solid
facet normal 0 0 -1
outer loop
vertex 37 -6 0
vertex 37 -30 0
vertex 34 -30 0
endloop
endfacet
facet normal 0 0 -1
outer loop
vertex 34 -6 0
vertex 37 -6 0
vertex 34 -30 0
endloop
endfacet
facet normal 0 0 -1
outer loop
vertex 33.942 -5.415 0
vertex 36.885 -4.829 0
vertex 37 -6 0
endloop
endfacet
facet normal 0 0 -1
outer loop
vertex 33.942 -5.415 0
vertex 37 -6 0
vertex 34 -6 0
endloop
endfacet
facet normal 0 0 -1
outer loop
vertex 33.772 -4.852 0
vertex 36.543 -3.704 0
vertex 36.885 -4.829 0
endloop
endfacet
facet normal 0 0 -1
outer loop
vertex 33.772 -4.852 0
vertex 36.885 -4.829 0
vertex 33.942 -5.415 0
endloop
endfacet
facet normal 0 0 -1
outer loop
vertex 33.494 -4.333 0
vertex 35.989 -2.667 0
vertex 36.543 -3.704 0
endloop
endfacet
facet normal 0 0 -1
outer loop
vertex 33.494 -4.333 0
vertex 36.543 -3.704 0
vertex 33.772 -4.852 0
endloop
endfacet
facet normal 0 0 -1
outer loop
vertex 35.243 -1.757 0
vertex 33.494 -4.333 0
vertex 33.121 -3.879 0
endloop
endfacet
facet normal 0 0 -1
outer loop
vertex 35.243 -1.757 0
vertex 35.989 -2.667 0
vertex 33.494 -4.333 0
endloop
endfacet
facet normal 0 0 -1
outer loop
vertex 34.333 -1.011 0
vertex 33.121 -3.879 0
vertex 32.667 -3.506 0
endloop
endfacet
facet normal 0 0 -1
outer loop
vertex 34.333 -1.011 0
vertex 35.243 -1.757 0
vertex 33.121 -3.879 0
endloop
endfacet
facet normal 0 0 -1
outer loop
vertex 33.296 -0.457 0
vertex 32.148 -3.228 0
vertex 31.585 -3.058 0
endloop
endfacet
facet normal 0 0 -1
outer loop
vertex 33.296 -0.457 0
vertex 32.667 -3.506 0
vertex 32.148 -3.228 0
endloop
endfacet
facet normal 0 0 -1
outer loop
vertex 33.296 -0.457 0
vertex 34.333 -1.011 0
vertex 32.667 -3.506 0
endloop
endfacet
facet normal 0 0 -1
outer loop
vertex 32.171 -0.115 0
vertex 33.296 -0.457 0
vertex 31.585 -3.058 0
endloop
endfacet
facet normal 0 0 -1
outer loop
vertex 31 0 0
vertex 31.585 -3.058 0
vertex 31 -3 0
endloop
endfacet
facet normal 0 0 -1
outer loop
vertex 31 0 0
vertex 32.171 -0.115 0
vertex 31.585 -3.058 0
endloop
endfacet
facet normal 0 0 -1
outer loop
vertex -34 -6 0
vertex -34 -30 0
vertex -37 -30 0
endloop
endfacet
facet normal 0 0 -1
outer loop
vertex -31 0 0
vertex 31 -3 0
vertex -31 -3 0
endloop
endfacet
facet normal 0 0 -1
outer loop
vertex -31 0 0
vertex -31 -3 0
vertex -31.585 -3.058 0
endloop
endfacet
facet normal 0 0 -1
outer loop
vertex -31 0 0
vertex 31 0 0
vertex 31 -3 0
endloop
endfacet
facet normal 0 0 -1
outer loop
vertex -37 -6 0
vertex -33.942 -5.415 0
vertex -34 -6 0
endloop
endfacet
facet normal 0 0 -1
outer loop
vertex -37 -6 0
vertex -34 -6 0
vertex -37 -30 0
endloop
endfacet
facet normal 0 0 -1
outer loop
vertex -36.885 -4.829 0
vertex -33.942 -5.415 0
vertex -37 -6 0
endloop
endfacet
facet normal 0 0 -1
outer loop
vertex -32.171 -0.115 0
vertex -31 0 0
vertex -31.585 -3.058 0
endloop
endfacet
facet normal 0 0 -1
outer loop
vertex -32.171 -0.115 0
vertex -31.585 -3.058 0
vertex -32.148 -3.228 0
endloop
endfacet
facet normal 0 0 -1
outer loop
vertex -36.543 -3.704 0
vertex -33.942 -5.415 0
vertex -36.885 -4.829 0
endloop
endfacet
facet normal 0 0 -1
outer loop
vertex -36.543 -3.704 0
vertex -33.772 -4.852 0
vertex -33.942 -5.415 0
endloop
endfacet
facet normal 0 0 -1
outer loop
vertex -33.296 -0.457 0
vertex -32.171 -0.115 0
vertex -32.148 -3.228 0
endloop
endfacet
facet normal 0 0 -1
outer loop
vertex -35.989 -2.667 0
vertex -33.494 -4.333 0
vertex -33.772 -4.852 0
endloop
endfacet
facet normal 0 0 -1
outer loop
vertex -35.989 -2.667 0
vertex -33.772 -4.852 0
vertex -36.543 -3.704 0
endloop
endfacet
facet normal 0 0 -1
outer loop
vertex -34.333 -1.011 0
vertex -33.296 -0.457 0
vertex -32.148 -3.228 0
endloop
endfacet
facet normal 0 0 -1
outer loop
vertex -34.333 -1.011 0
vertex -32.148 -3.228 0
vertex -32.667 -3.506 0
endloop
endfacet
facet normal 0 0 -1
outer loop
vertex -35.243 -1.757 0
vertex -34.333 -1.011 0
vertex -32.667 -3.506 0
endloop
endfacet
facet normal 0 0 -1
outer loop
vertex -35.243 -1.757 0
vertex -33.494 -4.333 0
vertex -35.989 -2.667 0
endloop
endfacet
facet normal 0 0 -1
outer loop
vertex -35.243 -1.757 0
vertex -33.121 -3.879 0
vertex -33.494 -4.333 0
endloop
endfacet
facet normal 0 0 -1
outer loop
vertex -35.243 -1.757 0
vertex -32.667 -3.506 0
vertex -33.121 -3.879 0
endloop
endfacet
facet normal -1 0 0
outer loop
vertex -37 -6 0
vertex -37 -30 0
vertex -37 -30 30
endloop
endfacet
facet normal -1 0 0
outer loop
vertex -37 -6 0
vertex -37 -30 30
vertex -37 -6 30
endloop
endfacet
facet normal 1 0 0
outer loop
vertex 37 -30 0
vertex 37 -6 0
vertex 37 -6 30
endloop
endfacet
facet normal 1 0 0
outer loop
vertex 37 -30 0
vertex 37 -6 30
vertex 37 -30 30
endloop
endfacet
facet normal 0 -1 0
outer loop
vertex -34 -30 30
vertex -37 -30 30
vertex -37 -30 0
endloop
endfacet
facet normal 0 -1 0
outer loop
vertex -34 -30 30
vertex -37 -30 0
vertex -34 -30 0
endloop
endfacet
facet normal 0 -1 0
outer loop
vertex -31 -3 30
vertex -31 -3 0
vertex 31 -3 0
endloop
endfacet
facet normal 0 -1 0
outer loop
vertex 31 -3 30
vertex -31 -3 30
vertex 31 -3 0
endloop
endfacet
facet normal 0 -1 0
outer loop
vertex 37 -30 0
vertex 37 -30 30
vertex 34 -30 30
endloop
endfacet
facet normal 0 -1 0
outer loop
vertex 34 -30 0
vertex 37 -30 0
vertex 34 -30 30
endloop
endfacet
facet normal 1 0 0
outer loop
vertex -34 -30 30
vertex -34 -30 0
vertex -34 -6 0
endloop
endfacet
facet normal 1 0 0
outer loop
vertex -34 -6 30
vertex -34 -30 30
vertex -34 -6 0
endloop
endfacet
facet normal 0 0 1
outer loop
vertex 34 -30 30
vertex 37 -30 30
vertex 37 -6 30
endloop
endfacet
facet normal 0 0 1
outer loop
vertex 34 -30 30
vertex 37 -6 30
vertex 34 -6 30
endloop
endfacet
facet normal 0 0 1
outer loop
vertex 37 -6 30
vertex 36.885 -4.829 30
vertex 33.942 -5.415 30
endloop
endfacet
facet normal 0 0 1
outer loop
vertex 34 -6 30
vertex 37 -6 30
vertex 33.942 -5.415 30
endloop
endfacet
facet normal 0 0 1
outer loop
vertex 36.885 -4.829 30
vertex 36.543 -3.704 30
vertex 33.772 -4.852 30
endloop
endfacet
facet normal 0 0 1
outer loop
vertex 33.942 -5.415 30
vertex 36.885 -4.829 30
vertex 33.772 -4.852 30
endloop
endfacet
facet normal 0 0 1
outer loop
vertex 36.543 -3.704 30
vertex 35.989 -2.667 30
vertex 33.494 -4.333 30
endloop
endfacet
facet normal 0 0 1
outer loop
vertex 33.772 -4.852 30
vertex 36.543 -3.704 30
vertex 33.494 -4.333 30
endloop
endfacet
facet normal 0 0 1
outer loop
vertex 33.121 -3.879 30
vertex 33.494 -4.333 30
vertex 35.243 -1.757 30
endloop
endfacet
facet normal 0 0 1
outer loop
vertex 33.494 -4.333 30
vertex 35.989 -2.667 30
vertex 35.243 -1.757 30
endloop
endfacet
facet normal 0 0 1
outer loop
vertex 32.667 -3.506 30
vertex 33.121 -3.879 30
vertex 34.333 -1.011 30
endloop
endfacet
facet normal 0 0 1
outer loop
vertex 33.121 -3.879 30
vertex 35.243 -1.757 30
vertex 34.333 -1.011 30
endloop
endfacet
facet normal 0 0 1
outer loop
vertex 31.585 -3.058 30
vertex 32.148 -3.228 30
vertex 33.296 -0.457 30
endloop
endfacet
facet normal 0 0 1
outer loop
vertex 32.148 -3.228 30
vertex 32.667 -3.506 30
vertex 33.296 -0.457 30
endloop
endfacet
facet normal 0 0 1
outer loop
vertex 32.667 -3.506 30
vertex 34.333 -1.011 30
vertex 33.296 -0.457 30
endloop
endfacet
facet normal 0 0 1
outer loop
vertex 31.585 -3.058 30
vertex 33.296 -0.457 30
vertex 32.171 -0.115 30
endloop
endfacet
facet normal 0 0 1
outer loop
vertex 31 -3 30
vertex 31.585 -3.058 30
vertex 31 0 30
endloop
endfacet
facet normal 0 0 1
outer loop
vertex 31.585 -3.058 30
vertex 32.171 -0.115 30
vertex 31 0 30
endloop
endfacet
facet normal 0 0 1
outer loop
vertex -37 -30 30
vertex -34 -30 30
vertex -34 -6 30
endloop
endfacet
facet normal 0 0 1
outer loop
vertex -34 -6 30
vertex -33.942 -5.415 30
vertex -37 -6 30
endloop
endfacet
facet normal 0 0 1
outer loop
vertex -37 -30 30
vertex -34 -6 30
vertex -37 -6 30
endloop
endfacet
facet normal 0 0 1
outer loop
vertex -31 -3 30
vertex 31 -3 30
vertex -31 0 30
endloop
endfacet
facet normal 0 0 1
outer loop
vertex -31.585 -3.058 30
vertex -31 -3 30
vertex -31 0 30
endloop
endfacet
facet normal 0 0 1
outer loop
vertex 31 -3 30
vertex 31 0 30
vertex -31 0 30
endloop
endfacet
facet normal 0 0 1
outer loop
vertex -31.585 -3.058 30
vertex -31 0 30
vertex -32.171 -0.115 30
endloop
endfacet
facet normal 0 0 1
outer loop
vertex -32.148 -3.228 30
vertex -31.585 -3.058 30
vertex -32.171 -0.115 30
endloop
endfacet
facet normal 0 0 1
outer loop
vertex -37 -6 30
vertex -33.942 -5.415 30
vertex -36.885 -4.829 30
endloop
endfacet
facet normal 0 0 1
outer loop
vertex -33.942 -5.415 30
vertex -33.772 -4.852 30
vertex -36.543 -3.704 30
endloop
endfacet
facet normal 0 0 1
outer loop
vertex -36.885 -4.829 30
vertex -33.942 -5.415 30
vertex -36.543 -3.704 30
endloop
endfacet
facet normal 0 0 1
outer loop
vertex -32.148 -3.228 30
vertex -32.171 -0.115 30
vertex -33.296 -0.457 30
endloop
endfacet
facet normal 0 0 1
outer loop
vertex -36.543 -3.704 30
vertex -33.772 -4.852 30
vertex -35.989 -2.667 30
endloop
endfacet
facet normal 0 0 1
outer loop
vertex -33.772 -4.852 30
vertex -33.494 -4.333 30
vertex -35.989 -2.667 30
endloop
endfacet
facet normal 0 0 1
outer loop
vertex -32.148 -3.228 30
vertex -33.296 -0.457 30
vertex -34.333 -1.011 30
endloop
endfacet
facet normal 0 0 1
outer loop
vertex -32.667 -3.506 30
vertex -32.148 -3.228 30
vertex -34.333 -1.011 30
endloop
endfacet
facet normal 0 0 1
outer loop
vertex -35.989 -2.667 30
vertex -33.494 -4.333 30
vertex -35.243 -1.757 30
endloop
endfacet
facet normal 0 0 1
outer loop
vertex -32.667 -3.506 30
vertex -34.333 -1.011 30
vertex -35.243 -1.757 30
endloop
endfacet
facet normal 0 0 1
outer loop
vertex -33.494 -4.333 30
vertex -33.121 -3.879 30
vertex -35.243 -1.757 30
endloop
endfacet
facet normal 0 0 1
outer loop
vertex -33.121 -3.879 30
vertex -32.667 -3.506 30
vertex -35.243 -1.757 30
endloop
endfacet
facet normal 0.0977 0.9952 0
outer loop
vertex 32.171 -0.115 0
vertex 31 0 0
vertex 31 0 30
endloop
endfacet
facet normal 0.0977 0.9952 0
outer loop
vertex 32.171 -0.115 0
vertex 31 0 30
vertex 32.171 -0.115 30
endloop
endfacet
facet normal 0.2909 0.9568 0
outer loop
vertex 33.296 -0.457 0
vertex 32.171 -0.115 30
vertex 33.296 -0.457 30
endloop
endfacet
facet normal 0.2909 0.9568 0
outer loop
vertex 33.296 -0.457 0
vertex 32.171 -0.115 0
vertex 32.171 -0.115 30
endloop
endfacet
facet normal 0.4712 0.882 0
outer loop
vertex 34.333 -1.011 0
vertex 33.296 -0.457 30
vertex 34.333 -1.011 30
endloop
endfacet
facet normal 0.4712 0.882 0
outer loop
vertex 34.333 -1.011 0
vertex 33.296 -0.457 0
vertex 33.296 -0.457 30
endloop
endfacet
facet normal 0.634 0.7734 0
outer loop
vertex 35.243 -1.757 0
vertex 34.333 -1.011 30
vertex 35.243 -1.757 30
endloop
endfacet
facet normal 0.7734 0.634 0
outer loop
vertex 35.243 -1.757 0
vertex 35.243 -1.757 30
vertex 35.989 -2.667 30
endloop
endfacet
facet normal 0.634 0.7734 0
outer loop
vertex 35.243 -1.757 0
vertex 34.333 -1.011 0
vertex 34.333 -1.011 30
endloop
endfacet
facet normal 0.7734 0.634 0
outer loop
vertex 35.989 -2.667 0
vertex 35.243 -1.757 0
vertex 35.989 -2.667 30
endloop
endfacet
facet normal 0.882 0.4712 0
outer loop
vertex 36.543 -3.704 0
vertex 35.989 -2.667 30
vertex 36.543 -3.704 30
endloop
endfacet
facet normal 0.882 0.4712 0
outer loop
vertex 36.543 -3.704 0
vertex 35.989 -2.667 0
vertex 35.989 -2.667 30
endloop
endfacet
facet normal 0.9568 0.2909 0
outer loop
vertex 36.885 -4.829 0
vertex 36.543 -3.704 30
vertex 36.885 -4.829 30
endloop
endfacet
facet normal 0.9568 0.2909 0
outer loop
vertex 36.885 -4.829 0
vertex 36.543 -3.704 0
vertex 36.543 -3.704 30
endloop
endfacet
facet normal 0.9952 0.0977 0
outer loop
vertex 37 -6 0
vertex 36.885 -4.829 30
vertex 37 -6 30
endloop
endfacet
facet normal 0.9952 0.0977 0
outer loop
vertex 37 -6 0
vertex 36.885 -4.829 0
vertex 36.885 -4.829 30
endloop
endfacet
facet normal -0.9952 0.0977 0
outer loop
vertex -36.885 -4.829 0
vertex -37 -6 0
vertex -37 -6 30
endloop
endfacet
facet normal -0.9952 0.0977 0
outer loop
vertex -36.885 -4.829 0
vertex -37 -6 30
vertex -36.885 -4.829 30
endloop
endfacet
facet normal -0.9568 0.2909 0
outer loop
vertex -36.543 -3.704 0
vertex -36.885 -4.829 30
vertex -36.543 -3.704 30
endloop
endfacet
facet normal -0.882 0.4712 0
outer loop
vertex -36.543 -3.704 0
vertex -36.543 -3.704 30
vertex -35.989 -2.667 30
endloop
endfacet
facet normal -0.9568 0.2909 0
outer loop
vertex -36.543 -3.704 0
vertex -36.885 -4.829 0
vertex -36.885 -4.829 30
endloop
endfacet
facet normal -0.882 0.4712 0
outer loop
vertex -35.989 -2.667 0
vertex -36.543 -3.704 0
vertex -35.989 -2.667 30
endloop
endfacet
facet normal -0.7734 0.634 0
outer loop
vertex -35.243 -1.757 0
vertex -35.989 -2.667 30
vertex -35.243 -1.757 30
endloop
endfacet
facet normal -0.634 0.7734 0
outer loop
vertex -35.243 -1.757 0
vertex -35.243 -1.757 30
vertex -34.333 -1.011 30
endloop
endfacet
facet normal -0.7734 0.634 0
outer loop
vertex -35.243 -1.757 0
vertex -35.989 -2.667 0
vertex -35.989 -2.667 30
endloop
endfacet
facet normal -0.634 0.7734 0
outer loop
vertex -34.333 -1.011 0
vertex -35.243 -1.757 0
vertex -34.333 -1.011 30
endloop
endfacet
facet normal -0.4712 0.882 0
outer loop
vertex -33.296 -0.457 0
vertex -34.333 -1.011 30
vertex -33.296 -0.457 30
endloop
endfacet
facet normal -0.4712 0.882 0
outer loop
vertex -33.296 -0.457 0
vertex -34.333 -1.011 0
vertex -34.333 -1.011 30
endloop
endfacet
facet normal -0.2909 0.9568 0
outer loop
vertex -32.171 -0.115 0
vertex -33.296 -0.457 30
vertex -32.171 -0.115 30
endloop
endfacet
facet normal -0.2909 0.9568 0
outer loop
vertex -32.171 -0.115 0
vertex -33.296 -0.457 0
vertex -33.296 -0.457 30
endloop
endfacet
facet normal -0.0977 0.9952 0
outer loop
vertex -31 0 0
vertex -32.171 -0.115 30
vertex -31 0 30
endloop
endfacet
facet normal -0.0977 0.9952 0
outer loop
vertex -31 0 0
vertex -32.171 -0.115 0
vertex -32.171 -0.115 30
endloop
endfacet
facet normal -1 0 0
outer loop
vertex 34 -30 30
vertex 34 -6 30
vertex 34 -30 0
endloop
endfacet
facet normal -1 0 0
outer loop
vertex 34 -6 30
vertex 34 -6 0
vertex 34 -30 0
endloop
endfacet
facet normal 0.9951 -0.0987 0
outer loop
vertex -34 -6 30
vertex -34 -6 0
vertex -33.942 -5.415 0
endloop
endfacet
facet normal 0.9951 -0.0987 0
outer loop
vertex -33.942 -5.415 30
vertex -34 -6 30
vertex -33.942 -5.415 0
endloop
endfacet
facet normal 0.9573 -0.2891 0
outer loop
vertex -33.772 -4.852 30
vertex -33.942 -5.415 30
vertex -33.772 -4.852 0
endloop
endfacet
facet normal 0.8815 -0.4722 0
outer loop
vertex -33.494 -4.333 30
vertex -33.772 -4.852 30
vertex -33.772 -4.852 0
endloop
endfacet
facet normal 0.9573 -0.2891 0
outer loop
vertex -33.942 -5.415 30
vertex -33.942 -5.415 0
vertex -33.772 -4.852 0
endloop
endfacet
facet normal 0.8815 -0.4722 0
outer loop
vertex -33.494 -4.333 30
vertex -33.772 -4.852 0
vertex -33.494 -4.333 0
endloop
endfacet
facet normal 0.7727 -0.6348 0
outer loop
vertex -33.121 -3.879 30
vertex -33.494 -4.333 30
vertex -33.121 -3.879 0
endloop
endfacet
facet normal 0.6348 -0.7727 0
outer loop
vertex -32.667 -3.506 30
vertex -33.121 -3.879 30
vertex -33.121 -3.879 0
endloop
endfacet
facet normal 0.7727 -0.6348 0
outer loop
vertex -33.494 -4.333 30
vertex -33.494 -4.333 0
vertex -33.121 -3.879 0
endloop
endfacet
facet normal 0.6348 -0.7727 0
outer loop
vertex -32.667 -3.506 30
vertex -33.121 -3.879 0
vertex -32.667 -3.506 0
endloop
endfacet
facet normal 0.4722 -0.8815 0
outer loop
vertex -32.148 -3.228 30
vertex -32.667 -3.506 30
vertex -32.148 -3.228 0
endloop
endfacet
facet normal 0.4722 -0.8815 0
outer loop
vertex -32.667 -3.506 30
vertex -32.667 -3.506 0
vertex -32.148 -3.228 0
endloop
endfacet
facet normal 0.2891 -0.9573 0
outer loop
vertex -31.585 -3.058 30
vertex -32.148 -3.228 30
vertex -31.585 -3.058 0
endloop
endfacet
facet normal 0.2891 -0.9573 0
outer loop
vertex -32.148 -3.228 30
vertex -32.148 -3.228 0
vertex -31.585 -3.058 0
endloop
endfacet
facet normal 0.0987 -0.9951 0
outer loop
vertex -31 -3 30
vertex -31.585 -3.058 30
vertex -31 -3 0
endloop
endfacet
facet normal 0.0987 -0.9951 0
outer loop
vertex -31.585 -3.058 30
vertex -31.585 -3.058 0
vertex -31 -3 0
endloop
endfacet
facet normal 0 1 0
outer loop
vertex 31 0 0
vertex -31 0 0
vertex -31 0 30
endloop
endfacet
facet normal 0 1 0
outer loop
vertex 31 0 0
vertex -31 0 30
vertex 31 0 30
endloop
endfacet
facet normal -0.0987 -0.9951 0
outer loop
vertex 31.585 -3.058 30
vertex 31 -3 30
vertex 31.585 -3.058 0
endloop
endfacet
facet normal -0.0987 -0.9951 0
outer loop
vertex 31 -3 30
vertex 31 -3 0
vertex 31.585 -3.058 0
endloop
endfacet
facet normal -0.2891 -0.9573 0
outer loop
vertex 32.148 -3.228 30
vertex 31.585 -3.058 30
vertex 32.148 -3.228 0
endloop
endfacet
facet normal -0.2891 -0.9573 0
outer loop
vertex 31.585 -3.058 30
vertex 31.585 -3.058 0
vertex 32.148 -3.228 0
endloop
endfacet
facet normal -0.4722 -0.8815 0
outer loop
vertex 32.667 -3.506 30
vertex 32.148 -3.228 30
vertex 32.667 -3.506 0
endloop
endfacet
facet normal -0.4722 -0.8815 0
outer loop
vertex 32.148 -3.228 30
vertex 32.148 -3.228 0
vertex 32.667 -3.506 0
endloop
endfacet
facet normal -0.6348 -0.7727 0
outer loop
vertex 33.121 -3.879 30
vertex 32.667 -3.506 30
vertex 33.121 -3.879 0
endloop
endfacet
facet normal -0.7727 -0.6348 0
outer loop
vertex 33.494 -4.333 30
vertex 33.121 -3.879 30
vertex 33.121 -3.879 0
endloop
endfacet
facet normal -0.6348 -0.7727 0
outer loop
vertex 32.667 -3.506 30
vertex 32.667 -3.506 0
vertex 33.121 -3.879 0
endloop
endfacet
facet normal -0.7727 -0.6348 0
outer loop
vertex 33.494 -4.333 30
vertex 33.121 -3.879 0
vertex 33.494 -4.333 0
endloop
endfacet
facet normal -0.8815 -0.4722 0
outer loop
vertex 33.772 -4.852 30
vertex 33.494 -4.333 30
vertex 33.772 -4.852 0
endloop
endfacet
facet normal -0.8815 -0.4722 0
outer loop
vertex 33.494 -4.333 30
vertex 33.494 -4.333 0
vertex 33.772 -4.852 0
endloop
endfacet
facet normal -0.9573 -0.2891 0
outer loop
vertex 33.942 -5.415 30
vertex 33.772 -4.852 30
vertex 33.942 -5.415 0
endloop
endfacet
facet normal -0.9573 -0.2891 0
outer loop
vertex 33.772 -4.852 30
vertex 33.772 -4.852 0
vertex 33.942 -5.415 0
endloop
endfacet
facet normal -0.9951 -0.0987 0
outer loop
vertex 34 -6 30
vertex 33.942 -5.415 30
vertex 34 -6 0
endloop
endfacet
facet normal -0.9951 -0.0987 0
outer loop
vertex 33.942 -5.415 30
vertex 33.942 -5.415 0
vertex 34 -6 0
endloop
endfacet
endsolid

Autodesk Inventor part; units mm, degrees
ref_plane "YZ Plane" through (0, 0, 0) normal (1, 0, 0) x (0, 1, 0)
ref_plane "XZ Plane" through (0, 0, 0) normal (0, 1, 0) x (-1, 0, 0)
ref_plane "XY Plane" through (0, 0, 0) normal (0, 0, 1) x (1, 0, 0)
sketch "Sketch1" plane through (0, 0, 0) normal (0, 0, 1) x (1, 0, 0)
  line L0 (-37, -30) -> (-37, 0)
  line L1 (-37, 0) -> (37, 0)
  line L2 (37, 0) -> (37, -30)
  point P0 (0, 0)
  point P1 (0, 0)
  dimension "d0" = 30
  dimension "d1" = 74
contour flange "Contour Flange1" sketch "Sketch1" thickness 3 bend radius 3 width 30 along (0, 0, 1) mid plane no both sides no wall seen from (-37, -15, 0) lies toward (1, 0, 0) curves L0 L1 L2
bend "Bend1"
corner "Corner1"
equation "\"d4\" = Thickness"
equation "\"d5\" = BendReliefWidth"
equation "\"d6\" = BendReliefDepth"
equation "\"d7\" = MinimumRemnant"
equation "\"d8\" = TransitionRadius"
equation "\"d10\" = BendRadius"
equation "\"d12\" = CornerReliefSize"
equation "\"d13\" = GapSize"
equation "\"d14\" = JacobiRadiusSize"
equation "\"BendRadius\" = Thickness"
equation "\"BendReliefWidth\" = Thickness"
equation "\"BendReliefDepth\" = 0.5 * Thickness"
equation "\"CornerReliefSize\" = 4 * Thickness"
equation "\"MinimumRemnant\" = 2 * Thickness"
equation "\"TransitionRadius\" = BendRadius"
equation "\"JacobiRadiusSize\" = BendRadius"
equation "\"GapSize\" = Thickness"
equation "\"Thickness\" = 3"
properties part number "ДМФ 01 55 Усилитель кассеты"
